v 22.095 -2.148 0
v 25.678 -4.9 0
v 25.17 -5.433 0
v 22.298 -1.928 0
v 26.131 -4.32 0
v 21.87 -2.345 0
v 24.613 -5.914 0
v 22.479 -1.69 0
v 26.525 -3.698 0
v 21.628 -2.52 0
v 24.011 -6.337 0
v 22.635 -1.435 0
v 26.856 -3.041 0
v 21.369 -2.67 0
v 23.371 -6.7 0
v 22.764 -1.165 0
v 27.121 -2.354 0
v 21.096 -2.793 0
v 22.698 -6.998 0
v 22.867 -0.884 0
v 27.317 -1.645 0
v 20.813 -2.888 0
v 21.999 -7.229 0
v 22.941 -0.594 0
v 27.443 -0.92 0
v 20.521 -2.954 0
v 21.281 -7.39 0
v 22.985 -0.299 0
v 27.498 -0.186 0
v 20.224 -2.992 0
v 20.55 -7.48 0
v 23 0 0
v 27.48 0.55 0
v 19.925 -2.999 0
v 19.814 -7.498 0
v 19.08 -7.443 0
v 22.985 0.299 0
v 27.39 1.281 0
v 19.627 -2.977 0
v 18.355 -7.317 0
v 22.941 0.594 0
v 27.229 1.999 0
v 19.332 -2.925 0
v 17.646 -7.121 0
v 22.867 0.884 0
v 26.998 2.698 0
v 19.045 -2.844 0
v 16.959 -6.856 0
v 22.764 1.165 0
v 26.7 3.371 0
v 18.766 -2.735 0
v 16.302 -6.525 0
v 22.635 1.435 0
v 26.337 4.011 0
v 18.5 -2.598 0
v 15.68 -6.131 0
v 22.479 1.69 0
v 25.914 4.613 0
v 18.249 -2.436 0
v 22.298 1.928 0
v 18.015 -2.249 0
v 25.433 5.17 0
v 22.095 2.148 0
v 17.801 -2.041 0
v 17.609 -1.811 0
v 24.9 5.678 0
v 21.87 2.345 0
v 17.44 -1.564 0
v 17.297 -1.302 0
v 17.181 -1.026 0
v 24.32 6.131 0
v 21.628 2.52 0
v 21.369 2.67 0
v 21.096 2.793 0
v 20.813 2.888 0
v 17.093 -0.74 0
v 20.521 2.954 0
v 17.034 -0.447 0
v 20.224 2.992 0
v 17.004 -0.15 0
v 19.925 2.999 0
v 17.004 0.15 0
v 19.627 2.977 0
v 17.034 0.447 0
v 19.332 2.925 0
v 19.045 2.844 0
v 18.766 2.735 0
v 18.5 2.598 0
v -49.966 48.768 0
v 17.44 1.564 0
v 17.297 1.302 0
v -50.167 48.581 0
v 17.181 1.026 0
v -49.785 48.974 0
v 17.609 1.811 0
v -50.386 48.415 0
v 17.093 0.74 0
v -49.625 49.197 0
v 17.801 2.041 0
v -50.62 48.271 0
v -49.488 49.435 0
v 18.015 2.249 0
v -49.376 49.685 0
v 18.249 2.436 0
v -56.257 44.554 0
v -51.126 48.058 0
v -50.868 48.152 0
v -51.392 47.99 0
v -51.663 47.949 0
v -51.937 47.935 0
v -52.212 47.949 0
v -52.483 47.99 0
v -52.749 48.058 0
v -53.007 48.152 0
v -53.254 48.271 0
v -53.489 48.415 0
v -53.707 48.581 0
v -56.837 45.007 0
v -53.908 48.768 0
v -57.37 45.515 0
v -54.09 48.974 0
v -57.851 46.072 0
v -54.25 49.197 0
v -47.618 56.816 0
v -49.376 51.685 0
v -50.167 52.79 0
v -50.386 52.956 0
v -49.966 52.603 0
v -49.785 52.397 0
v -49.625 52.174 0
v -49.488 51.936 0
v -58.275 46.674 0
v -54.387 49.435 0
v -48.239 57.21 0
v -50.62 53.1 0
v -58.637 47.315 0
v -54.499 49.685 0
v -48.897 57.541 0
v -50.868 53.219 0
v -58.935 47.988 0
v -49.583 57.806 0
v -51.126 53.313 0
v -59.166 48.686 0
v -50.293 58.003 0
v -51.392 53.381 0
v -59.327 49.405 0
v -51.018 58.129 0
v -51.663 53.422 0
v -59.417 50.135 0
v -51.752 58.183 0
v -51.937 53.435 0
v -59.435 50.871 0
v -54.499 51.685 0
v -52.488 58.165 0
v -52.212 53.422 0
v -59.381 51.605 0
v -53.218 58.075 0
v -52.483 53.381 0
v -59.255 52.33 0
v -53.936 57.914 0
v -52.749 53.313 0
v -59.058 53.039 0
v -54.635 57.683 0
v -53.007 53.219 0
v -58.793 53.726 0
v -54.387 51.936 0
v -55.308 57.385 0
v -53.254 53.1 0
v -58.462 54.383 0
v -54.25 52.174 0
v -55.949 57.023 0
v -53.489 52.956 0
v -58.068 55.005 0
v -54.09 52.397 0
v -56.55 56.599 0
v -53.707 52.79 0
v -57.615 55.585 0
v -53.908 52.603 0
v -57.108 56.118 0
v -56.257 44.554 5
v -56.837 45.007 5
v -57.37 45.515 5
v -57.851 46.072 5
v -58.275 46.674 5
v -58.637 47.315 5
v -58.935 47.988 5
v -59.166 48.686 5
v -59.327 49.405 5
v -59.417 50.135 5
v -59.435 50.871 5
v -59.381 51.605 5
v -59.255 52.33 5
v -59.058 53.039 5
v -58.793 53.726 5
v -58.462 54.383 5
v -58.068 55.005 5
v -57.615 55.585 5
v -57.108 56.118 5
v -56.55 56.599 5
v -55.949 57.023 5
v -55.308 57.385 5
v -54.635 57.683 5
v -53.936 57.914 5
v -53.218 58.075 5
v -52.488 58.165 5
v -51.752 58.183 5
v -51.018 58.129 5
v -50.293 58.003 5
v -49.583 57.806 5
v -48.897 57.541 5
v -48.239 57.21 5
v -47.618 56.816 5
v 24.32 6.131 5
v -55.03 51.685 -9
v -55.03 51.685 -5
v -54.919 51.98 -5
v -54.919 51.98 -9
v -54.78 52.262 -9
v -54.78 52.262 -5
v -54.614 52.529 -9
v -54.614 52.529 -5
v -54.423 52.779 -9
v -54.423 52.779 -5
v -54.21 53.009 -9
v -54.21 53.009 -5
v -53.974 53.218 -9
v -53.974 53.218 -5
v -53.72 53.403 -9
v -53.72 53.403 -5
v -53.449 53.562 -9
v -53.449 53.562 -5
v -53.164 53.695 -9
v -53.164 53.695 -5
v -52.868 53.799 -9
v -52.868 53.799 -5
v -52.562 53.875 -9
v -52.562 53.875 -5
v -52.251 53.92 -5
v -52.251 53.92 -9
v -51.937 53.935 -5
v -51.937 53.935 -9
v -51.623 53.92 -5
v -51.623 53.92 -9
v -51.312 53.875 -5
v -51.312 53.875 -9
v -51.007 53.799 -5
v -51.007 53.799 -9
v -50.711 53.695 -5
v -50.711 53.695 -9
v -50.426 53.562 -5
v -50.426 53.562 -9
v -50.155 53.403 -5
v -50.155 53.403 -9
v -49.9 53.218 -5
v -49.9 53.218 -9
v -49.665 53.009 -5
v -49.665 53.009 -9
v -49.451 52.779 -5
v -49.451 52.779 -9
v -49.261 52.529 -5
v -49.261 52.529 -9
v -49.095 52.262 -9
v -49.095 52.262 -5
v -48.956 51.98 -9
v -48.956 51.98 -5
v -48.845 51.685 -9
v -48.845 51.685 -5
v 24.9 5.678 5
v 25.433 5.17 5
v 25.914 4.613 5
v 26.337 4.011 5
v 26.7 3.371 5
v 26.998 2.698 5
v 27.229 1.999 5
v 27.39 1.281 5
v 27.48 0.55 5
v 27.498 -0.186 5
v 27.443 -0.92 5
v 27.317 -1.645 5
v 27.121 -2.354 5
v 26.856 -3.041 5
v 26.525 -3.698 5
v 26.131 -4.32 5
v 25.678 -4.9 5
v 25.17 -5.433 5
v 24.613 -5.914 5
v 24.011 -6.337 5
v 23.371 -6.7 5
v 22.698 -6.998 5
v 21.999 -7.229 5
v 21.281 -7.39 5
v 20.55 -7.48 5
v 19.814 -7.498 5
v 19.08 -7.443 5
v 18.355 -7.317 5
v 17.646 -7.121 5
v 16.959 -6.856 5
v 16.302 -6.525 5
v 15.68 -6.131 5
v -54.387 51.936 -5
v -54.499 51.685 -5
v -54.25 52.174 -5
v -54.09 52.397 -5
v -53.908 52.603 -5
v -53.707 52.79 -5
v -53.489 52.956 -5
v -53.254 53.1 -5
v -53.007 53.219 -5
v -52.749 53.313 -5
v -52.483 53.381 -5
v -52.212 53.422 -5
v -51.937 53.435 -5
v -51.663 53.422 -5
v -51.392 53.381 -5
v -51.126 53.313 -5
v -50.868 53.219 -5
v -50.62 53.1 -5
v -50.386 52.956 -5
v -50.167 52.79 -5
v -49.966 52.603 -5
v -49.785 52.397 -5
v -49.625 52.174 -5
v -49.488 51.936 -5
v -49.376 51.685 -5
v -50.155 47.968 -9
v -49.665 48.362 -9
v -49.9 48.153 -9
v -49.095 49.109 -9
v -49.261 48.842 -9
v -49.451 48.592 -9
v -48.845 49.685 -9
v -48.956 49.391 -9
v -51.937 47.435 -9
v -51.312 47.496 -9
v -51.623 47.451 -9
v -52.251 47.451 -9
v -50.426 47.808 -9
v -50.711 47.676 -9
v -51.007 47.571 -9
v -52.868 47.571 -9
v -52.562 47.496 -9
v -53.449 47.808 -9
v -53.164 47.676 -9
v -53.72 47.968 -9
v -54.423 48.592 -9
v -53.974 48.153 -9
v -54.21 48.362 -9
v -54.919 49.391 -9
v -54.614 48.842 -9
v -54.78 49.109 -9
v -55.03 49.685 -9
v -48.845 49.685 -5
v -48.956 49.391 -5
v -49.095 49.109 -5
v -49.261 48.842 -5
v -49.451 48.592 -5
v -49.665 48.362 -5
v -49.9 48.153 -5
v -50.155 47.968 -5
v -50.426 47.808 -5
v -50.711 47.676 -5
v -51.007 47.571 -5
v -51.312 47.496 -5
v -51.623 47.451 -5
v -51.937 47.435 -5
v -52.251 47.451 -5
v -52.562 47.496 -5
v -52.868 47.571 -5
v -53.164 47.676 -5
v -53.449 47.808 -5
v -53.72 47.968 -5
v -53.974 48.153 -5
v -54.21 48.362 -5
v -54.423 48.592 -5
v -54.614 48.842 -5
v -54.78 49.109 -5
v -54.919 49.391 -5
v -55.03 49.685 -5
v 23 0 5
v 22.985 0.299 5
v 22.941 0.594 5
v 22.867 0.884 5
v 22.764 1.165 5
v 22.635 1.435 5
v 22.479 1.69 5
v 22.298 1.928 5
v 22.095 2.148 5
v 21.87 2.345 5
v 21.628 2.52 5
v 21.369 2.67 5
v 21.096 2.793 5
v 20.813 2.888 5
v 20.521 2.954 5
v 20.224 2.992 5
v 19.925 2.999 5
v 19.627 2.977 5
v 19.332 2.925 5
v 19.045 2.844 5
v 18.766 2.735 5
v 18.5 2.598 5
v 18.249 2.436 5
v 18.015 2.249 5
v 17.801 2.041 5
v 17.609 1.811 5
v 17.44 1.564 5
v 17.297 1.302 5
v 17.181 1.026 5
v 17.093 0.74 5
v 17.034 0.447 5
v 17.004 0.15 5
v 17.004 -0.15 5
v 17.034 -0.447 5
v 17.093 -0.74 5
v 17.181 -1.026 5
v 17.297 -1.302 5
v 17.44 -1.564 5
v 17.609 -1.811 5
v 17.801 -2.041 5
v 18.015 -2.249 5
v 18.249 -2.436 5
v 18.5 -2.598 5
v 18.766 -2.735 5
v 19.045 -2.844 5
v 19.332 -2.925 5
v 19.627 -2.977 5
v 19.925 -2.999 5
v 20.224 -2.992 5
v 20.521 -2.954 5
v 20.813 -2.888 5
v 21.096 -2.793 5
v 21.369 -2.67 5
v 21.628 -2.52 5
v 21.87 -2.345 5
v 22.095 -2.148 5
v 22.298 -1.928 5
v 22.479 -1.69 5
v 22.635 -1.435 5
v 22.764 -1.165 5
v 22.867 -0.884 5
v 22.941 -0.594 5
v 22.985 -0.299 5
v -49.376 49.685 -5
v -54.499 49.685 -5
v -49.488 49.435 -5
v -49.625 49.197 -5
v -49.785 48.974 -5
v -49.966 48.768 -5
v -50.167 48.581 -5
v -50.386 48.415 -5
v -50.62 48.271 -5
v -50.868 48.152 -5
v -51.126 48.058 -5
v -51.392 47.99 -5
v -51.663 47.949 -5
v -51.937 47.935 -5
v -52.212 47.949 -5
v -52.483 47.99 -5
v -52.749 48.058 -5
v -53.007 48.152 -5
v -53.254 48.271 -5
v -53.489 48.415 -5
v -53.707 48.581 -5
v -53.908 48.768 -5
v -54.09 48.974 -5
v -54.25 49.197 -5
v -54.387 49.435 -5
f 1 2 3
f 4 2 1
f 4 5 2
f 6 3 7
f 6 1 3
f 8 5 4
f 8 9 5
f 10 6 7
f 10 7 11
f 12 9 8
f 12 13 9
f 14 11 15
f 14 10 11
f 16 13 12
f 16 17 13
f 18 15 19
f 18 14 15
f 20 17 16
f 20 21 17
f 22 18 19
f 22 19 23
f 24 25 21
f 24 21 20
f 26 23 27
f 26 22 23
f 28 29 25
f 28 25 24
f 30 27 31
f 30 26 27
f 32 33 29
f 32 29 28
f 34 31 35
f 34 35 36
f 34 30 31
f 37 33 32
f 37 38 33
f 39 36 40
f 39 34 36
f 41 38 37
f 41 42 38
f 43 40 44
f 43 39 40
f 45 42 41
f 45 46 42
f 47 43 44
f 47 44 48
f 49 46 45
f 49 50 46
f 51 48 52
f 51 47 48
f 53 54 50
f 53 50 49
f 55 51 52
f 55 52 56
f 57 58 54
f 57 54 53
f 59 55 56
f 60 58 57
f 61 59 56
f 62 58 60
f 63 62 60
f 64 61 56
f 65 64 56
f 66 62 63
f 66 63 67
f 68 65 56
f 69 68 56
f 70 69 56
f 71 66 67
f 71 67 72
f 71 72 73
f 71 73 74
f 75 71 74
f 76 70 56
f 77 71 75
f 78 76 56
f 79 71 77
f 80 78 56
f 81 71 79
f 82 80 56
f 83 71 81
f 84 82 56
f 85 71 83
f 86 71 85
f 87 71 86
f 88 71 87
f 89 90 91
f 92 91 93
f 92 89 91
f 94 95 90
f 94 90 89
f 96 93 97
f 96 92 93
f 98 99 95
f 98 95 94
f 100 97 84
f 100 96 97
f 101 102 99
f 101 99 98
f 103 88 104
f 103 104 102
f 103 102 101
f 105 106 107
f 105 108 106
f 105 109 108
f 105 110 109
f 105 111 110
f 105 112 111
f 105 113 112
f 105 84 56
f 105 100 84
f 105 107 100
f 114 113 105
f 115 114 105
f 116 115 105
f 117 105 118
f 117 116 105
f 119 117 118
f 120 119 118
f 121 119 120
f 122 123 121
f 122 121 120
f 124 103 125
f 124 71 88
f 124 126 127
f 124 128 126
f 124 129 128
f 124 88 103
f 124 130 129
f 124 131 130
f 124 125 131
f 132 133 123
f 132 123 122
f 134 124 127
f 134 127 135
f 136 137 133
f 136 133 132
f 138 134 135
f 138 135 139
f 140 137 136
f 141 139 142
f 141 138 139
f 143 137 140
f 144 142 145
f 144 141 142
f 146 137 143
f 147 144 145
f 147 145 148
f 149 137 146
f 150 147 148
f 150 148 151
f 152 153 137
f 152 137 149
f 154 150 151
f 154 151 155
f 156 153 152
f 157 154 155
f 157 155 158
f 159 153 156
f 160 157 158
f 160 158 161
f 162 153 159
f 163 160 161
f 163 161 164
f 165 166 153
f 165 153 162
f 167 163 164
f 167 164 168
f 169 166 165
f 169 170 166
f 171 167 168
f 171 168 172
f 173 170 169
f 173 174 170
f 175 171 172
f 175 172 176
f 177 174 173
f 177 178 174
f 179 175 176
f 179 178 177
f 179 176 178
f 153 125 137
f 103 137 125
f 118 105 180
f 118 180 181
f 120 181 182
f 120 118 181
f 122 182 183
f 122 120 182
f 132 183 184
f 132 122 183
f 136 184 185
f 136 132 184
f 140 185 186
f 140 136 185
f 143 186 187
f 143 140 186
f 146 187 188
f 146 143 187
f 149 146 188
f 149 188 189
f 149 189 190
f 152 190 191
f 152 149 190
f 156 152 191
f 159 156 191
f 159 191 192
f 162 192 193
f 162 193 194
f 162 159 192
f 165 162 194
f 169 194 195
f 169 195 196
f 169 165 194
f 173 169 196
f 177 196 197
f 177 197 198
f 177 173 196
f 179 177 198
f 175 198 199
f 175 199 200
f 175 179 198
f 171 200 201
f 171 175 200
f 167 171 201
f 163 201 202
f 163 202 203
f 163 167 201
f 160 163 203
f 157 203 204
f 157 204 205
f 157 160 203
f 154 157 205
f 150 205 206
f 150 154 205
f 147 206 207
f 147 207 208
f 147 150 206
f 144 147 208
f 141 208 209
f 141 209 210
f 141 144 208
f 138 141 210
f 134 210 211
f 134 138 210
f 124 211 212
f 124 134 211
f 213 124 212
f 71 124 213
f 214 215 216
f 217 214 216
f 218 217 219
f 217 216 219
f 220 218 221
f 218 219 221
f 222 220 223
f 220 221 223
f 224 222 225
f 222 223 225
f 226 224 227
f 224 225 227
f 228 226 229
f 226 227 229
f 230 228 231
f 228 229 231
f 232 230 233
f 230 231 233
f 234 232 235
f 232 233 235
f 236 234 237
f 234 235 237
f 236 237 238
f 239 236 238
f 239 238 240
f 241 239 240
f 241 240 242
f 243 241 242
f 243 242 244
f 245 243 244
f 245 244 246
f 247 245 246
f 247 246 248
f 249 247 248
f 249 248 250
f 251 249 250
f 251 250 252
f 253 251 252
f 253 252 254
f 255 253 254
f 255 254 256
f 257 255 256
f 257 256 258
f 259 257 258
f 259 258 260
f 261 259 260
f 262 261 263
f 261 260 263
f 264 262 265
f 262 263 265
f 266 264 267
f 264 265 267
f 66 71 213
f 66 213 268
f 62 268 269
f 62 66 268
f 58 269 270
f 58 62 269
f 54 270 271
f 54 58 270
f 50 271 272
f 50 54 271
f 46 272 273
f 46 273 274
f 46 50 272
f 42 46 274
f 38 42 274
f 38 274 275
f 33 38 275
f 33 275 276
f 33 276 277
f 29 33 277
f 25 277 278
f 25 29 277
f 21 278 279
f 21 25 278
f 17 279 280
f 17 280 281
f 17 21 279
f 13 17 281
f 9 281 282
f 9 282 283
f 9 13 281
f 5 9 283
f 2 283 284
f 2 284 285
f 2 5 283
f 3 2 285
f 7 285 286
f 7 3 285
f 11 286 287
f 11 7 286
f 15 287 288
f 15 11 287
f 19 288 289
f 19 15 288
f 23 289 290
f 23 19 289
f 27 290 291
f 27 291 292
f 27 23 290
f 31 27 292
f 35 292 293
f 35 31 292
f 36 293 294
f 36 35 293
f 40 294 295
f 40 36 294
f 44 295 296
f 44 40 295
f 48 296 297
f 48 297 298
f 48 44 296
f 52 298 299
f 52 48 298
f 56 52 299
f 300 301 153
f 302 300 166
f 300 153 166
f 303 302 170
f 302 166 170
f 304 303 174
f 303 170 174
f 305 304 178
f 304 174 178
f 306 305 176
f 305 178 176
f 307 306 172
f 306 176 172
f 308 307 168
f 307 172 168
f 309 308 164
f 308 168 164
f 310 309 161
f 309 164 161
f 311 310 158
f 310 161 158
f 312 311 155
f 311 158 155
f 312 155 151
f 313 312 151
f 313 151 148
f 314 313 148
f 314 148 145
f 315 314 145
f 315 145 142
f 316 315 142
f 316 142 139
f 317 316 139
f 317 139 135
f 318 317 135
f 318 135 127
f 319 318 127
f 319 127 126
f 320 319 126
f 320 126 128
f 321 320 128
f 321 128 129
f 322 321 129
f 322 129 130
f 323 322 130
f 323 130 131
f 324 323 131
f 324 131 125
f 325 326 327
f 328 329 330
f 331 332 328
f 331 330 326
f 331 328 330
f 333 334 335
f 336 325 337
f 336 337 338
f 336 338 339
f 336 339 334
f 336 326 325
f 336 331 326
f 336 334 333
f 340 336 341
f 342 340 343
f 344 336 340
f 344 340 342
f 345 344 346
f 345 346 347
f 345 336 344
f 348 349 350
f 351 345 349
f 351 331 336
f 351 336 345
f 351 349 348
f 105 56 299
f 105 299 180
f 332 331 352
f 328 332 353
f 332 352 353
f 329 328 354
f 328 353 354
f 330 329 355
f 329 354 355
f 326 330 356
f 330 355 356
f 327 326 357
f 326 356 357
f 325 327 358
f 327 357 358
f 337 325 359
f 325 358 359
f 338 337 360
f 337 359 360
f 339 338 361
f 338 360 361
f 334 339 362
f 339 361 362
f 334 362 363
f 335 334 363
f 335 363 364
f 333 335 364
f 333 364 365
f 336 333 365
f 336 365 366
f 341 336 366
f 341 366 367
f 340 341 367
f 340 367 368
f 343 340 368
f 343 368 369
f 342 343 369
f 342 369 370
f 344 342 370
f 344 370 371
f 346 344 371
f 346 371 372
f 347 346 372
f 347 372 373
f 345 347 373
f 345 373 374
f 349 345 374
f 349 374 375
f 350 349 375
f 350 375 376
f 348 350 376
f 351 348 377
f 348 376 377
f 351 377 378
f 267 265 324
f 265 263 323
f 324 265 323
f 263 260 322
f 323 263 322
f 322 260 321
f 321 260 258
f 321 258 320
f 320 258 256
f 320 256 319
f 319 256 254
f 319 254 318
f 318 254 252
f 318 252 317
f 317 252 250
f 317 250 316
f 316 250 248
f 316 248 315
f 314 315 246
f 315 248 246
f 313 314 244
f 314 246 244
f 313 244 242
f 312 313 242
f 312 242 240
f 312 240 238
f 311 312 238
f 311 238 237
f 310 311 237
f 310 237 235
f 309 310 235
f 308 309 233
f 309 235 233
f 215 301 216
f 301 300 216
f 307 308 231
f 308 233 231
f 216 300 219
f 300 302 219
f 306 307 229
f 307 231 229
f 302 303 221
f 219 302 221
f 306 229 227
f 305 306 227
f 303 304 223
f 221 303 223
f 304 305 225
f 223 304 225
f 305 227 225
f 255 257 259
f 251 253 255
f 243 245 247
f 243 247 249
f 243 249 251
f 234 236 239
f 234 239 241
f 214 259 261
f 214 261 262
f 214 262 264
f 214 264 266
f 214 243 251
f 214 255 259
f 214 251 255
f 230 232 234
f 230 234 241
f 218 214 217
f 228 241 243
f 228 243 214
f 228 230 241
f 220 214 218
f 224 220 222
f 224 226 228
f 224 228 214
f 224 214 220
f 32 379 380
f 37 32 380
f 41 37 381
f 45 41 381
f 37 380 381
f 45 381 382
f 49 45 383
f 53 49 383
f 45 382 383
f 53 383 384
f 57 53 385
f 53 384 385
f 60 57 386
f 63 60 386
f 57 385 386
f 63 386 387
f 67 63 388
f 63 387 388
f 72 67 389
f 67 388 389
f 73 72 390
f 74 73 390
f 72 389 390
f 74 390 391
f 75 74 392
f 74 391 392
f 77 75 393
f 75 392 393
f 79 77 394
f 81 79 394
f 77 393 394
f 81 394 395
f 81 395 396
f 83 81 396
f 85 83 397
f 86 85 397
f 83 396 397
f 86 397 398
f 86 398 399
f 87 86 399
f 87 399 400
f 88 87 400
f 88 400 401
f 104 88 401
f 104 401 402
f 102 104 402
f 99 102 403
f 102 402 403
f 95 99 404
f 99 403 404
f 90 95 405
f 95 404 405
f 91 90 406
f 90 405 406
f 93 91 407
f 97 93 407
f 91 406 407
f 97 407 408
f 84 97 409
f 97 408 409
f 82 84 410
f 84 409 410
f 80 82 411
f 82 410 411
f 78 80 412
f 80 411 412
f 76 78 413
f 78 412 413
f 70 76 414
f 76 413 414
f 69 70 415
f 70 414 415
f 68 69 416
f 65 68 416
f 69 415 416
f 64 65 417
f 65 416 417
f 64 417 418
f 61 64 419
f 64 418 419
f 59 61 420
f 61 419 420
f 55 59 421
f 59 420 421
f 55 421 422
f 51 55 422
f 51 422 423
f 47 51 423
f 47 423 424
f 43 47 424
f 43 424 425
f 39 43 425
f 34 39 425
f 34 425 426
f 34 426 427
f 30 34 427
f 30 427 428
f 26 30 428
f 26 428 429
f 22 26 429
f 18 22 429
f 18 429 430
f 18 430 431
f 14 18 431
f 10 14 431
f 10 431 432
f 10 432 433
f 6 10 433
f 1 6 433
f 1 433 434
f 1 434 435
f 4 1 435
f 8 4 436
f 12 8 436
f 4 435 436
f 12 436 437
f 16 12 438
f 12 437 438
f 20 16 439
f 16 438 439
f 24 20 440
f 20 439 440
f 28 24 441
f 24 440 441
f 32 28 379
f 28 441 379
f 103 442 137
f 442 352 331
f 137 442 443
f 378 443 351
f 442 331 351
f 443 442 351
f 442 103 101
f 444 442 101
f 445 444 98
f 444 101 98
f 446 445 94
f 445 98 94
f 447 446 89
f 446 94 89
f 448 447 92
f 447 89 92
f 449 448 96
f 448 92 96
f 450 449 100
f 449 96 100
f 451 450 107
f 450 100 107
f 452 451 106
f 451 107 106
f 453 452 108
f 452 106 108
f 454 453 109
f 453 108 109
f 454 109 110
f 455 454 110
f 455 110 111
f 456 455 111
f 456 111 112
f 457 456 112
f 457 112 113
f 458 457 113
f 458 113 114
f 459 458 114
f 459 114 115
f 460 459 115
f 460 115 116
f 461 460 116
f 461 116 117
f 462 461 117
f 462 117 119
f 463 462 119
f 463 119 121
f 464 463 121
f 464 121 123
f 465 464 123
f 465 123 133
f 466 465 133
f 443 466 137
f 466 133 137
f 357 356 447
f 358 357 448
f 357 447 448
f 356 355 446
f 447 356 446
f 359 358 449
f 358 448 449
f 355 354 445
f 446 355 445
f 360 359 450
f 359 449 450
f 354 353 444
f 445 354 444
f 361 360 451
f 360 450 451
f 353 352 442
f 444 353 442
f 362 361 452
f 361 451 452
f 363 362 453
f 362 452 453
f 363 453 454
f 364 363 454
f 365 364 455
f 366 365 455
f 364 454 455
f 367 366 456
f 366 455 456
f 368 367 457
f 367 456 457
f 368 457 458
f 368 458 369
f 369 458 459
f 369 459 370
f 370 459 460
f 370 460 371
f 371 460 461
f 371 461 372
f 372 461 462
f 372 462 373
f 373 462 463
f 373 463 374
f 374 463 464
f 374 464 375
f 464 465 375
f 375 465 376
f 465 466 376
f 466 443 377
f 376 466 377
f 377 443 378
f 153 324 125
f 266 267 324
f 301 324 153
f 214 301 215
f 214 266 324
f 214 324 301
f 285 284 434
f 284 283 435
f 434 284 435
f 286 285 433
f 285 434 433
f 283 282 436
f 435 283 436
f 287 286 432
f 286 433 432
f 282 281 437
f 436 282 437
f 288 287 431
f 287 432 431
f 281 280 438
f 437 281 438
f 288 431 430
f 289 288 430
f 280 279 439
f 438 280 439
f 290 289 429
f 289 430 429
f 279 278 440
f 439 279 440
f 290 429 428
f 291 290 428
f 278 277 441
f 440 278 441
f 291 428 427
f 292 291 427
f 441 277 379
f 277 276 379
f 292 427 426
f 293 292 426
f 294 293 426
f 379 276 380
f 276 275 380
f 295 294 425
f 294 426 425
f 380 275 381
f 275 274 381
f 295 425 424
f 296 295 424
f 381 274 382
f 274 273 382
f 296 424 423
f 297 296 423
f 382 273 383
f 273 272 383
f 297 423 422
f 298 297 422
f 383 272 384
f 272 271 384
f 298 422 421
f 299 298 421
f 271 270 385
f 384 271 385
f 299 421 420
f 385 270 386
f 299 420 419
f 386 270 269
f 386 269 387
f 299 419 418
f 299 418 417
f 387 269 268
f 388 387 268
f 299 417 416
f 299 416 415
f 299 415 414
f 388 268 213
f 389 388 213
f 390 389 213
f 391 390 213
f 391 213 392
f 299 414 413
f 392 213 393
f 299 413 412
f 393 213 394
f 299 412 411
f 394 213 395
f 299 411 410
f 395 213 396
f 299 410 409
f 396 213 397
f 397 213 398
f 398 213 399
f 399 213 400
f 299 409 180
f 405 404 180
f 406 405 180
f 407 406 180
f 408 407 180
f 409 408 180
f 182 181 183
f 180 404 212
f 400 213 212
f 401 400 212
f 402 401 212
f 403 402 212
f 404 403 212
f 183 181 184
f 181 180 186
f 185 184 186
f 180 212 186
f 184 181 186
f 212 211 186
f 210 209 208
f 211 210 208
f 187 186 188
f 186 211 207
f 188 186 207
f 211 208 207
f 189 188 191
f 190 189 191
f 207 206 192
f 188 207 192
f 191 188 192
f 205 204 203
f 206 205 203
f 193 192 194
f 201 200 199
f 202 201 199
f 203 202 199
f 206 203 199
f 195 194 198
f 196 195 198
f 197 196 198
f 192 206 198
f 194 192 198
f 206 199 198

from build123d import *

# Parameters (mm, degrees)
BOSS_EXTRU_1_DEPTH      = 5
ESQUISSE2_R             = 3
ENL_V_MAT_EXTRU_1_DEPTH = 5
ESQUISSE3_R             = 2.75
BOSS_EXTRU_2_DEPTH      = 5
ESQUISSE4_R             = 3.25
BOSS_EXTRU_3_DEPTH      = 4
ESQUISSE5_W             = 10
ESQUISSE5_H             = 2
ENL_V_MAT_EXTRU_2_DEPTH = 9


with BuildPart() as part:
    # Esquisse1 → Boss.-Extru.1 (new body)
    with BuildSketch(Plane.XY):
        with BuildLine():
            Line((15.680221033, -6.131028436), (-56.257179278, 44.554378107))
            ThreePointArc((-56.257179278, 44.554378107), (-58.068428747, 55.00518551), (-47.617621345, 56.816434978))
            Line((-47.617621345, 56.816434978), (24.319778967, 6.131028436))
            ThreePointArc((24.319778967, 6.131028436), (26.131028436, -4.319778967), (15.680221033, -6.131028436))
        make_face()
    extrude(amount=BOSS_EXTRU_1_DEPTH)

    # Esquisse2 → Enlèv. mat.-Extru.1 (cut)
    with BuildSketch(Plane.XY.offset(5)):
        with Locations((20, 0)):
            Circle(ESQUISSE2_R)
    extrude(amount=-ENL_V_MAT_EXTRU_1_DEPTH, mode=Mode.SUBTRACT)

    # Esquisse3 → Boss.-Extru.2 (add)
    with BuildSketch(Plane(origin=(0, 0, 0), x_dir=(-1, 0, 0), z_dir=(0, 0, -1))):
        with Locations(Location((51.937400312, 50.685406543, 0), (0, 0, 180))):
            Circle(ESQUISSE3_R)
    extrude(amount=BOSS_EXTRU_2_DEPTH)

    # Esquisse4 → Boss.-Extru.3 (add)
    with BuildSketch(Plane(origin=(0, 0, -5), x_dir=(-1, 0, 0), z_dir=(0, 0, -1))):
        with Locations((51.937400312, 50.685406543)):
            Circle(ESQUISSE4_R)
    extrude(amount=BOSS_EXTRU_3_DEPTH)

    # Esquisse5 → Enlèv. mat.-Extru.2 (cut)
    with BuildSketch(Plane(origin=(0, 0, -9), x_dir=(-1, 0, 0), z_dir=(0, 0, -1))):
        with Locations((51.937400312, 50.685406543)):
            Rectangle(ESQUISSE5_W, ESQUISSE5_H)
    extrude(amount=-ENL_V_MAT_EXTRU_2_DEPTH, mode=Mode.SUBTRACT)


solid = part.part
